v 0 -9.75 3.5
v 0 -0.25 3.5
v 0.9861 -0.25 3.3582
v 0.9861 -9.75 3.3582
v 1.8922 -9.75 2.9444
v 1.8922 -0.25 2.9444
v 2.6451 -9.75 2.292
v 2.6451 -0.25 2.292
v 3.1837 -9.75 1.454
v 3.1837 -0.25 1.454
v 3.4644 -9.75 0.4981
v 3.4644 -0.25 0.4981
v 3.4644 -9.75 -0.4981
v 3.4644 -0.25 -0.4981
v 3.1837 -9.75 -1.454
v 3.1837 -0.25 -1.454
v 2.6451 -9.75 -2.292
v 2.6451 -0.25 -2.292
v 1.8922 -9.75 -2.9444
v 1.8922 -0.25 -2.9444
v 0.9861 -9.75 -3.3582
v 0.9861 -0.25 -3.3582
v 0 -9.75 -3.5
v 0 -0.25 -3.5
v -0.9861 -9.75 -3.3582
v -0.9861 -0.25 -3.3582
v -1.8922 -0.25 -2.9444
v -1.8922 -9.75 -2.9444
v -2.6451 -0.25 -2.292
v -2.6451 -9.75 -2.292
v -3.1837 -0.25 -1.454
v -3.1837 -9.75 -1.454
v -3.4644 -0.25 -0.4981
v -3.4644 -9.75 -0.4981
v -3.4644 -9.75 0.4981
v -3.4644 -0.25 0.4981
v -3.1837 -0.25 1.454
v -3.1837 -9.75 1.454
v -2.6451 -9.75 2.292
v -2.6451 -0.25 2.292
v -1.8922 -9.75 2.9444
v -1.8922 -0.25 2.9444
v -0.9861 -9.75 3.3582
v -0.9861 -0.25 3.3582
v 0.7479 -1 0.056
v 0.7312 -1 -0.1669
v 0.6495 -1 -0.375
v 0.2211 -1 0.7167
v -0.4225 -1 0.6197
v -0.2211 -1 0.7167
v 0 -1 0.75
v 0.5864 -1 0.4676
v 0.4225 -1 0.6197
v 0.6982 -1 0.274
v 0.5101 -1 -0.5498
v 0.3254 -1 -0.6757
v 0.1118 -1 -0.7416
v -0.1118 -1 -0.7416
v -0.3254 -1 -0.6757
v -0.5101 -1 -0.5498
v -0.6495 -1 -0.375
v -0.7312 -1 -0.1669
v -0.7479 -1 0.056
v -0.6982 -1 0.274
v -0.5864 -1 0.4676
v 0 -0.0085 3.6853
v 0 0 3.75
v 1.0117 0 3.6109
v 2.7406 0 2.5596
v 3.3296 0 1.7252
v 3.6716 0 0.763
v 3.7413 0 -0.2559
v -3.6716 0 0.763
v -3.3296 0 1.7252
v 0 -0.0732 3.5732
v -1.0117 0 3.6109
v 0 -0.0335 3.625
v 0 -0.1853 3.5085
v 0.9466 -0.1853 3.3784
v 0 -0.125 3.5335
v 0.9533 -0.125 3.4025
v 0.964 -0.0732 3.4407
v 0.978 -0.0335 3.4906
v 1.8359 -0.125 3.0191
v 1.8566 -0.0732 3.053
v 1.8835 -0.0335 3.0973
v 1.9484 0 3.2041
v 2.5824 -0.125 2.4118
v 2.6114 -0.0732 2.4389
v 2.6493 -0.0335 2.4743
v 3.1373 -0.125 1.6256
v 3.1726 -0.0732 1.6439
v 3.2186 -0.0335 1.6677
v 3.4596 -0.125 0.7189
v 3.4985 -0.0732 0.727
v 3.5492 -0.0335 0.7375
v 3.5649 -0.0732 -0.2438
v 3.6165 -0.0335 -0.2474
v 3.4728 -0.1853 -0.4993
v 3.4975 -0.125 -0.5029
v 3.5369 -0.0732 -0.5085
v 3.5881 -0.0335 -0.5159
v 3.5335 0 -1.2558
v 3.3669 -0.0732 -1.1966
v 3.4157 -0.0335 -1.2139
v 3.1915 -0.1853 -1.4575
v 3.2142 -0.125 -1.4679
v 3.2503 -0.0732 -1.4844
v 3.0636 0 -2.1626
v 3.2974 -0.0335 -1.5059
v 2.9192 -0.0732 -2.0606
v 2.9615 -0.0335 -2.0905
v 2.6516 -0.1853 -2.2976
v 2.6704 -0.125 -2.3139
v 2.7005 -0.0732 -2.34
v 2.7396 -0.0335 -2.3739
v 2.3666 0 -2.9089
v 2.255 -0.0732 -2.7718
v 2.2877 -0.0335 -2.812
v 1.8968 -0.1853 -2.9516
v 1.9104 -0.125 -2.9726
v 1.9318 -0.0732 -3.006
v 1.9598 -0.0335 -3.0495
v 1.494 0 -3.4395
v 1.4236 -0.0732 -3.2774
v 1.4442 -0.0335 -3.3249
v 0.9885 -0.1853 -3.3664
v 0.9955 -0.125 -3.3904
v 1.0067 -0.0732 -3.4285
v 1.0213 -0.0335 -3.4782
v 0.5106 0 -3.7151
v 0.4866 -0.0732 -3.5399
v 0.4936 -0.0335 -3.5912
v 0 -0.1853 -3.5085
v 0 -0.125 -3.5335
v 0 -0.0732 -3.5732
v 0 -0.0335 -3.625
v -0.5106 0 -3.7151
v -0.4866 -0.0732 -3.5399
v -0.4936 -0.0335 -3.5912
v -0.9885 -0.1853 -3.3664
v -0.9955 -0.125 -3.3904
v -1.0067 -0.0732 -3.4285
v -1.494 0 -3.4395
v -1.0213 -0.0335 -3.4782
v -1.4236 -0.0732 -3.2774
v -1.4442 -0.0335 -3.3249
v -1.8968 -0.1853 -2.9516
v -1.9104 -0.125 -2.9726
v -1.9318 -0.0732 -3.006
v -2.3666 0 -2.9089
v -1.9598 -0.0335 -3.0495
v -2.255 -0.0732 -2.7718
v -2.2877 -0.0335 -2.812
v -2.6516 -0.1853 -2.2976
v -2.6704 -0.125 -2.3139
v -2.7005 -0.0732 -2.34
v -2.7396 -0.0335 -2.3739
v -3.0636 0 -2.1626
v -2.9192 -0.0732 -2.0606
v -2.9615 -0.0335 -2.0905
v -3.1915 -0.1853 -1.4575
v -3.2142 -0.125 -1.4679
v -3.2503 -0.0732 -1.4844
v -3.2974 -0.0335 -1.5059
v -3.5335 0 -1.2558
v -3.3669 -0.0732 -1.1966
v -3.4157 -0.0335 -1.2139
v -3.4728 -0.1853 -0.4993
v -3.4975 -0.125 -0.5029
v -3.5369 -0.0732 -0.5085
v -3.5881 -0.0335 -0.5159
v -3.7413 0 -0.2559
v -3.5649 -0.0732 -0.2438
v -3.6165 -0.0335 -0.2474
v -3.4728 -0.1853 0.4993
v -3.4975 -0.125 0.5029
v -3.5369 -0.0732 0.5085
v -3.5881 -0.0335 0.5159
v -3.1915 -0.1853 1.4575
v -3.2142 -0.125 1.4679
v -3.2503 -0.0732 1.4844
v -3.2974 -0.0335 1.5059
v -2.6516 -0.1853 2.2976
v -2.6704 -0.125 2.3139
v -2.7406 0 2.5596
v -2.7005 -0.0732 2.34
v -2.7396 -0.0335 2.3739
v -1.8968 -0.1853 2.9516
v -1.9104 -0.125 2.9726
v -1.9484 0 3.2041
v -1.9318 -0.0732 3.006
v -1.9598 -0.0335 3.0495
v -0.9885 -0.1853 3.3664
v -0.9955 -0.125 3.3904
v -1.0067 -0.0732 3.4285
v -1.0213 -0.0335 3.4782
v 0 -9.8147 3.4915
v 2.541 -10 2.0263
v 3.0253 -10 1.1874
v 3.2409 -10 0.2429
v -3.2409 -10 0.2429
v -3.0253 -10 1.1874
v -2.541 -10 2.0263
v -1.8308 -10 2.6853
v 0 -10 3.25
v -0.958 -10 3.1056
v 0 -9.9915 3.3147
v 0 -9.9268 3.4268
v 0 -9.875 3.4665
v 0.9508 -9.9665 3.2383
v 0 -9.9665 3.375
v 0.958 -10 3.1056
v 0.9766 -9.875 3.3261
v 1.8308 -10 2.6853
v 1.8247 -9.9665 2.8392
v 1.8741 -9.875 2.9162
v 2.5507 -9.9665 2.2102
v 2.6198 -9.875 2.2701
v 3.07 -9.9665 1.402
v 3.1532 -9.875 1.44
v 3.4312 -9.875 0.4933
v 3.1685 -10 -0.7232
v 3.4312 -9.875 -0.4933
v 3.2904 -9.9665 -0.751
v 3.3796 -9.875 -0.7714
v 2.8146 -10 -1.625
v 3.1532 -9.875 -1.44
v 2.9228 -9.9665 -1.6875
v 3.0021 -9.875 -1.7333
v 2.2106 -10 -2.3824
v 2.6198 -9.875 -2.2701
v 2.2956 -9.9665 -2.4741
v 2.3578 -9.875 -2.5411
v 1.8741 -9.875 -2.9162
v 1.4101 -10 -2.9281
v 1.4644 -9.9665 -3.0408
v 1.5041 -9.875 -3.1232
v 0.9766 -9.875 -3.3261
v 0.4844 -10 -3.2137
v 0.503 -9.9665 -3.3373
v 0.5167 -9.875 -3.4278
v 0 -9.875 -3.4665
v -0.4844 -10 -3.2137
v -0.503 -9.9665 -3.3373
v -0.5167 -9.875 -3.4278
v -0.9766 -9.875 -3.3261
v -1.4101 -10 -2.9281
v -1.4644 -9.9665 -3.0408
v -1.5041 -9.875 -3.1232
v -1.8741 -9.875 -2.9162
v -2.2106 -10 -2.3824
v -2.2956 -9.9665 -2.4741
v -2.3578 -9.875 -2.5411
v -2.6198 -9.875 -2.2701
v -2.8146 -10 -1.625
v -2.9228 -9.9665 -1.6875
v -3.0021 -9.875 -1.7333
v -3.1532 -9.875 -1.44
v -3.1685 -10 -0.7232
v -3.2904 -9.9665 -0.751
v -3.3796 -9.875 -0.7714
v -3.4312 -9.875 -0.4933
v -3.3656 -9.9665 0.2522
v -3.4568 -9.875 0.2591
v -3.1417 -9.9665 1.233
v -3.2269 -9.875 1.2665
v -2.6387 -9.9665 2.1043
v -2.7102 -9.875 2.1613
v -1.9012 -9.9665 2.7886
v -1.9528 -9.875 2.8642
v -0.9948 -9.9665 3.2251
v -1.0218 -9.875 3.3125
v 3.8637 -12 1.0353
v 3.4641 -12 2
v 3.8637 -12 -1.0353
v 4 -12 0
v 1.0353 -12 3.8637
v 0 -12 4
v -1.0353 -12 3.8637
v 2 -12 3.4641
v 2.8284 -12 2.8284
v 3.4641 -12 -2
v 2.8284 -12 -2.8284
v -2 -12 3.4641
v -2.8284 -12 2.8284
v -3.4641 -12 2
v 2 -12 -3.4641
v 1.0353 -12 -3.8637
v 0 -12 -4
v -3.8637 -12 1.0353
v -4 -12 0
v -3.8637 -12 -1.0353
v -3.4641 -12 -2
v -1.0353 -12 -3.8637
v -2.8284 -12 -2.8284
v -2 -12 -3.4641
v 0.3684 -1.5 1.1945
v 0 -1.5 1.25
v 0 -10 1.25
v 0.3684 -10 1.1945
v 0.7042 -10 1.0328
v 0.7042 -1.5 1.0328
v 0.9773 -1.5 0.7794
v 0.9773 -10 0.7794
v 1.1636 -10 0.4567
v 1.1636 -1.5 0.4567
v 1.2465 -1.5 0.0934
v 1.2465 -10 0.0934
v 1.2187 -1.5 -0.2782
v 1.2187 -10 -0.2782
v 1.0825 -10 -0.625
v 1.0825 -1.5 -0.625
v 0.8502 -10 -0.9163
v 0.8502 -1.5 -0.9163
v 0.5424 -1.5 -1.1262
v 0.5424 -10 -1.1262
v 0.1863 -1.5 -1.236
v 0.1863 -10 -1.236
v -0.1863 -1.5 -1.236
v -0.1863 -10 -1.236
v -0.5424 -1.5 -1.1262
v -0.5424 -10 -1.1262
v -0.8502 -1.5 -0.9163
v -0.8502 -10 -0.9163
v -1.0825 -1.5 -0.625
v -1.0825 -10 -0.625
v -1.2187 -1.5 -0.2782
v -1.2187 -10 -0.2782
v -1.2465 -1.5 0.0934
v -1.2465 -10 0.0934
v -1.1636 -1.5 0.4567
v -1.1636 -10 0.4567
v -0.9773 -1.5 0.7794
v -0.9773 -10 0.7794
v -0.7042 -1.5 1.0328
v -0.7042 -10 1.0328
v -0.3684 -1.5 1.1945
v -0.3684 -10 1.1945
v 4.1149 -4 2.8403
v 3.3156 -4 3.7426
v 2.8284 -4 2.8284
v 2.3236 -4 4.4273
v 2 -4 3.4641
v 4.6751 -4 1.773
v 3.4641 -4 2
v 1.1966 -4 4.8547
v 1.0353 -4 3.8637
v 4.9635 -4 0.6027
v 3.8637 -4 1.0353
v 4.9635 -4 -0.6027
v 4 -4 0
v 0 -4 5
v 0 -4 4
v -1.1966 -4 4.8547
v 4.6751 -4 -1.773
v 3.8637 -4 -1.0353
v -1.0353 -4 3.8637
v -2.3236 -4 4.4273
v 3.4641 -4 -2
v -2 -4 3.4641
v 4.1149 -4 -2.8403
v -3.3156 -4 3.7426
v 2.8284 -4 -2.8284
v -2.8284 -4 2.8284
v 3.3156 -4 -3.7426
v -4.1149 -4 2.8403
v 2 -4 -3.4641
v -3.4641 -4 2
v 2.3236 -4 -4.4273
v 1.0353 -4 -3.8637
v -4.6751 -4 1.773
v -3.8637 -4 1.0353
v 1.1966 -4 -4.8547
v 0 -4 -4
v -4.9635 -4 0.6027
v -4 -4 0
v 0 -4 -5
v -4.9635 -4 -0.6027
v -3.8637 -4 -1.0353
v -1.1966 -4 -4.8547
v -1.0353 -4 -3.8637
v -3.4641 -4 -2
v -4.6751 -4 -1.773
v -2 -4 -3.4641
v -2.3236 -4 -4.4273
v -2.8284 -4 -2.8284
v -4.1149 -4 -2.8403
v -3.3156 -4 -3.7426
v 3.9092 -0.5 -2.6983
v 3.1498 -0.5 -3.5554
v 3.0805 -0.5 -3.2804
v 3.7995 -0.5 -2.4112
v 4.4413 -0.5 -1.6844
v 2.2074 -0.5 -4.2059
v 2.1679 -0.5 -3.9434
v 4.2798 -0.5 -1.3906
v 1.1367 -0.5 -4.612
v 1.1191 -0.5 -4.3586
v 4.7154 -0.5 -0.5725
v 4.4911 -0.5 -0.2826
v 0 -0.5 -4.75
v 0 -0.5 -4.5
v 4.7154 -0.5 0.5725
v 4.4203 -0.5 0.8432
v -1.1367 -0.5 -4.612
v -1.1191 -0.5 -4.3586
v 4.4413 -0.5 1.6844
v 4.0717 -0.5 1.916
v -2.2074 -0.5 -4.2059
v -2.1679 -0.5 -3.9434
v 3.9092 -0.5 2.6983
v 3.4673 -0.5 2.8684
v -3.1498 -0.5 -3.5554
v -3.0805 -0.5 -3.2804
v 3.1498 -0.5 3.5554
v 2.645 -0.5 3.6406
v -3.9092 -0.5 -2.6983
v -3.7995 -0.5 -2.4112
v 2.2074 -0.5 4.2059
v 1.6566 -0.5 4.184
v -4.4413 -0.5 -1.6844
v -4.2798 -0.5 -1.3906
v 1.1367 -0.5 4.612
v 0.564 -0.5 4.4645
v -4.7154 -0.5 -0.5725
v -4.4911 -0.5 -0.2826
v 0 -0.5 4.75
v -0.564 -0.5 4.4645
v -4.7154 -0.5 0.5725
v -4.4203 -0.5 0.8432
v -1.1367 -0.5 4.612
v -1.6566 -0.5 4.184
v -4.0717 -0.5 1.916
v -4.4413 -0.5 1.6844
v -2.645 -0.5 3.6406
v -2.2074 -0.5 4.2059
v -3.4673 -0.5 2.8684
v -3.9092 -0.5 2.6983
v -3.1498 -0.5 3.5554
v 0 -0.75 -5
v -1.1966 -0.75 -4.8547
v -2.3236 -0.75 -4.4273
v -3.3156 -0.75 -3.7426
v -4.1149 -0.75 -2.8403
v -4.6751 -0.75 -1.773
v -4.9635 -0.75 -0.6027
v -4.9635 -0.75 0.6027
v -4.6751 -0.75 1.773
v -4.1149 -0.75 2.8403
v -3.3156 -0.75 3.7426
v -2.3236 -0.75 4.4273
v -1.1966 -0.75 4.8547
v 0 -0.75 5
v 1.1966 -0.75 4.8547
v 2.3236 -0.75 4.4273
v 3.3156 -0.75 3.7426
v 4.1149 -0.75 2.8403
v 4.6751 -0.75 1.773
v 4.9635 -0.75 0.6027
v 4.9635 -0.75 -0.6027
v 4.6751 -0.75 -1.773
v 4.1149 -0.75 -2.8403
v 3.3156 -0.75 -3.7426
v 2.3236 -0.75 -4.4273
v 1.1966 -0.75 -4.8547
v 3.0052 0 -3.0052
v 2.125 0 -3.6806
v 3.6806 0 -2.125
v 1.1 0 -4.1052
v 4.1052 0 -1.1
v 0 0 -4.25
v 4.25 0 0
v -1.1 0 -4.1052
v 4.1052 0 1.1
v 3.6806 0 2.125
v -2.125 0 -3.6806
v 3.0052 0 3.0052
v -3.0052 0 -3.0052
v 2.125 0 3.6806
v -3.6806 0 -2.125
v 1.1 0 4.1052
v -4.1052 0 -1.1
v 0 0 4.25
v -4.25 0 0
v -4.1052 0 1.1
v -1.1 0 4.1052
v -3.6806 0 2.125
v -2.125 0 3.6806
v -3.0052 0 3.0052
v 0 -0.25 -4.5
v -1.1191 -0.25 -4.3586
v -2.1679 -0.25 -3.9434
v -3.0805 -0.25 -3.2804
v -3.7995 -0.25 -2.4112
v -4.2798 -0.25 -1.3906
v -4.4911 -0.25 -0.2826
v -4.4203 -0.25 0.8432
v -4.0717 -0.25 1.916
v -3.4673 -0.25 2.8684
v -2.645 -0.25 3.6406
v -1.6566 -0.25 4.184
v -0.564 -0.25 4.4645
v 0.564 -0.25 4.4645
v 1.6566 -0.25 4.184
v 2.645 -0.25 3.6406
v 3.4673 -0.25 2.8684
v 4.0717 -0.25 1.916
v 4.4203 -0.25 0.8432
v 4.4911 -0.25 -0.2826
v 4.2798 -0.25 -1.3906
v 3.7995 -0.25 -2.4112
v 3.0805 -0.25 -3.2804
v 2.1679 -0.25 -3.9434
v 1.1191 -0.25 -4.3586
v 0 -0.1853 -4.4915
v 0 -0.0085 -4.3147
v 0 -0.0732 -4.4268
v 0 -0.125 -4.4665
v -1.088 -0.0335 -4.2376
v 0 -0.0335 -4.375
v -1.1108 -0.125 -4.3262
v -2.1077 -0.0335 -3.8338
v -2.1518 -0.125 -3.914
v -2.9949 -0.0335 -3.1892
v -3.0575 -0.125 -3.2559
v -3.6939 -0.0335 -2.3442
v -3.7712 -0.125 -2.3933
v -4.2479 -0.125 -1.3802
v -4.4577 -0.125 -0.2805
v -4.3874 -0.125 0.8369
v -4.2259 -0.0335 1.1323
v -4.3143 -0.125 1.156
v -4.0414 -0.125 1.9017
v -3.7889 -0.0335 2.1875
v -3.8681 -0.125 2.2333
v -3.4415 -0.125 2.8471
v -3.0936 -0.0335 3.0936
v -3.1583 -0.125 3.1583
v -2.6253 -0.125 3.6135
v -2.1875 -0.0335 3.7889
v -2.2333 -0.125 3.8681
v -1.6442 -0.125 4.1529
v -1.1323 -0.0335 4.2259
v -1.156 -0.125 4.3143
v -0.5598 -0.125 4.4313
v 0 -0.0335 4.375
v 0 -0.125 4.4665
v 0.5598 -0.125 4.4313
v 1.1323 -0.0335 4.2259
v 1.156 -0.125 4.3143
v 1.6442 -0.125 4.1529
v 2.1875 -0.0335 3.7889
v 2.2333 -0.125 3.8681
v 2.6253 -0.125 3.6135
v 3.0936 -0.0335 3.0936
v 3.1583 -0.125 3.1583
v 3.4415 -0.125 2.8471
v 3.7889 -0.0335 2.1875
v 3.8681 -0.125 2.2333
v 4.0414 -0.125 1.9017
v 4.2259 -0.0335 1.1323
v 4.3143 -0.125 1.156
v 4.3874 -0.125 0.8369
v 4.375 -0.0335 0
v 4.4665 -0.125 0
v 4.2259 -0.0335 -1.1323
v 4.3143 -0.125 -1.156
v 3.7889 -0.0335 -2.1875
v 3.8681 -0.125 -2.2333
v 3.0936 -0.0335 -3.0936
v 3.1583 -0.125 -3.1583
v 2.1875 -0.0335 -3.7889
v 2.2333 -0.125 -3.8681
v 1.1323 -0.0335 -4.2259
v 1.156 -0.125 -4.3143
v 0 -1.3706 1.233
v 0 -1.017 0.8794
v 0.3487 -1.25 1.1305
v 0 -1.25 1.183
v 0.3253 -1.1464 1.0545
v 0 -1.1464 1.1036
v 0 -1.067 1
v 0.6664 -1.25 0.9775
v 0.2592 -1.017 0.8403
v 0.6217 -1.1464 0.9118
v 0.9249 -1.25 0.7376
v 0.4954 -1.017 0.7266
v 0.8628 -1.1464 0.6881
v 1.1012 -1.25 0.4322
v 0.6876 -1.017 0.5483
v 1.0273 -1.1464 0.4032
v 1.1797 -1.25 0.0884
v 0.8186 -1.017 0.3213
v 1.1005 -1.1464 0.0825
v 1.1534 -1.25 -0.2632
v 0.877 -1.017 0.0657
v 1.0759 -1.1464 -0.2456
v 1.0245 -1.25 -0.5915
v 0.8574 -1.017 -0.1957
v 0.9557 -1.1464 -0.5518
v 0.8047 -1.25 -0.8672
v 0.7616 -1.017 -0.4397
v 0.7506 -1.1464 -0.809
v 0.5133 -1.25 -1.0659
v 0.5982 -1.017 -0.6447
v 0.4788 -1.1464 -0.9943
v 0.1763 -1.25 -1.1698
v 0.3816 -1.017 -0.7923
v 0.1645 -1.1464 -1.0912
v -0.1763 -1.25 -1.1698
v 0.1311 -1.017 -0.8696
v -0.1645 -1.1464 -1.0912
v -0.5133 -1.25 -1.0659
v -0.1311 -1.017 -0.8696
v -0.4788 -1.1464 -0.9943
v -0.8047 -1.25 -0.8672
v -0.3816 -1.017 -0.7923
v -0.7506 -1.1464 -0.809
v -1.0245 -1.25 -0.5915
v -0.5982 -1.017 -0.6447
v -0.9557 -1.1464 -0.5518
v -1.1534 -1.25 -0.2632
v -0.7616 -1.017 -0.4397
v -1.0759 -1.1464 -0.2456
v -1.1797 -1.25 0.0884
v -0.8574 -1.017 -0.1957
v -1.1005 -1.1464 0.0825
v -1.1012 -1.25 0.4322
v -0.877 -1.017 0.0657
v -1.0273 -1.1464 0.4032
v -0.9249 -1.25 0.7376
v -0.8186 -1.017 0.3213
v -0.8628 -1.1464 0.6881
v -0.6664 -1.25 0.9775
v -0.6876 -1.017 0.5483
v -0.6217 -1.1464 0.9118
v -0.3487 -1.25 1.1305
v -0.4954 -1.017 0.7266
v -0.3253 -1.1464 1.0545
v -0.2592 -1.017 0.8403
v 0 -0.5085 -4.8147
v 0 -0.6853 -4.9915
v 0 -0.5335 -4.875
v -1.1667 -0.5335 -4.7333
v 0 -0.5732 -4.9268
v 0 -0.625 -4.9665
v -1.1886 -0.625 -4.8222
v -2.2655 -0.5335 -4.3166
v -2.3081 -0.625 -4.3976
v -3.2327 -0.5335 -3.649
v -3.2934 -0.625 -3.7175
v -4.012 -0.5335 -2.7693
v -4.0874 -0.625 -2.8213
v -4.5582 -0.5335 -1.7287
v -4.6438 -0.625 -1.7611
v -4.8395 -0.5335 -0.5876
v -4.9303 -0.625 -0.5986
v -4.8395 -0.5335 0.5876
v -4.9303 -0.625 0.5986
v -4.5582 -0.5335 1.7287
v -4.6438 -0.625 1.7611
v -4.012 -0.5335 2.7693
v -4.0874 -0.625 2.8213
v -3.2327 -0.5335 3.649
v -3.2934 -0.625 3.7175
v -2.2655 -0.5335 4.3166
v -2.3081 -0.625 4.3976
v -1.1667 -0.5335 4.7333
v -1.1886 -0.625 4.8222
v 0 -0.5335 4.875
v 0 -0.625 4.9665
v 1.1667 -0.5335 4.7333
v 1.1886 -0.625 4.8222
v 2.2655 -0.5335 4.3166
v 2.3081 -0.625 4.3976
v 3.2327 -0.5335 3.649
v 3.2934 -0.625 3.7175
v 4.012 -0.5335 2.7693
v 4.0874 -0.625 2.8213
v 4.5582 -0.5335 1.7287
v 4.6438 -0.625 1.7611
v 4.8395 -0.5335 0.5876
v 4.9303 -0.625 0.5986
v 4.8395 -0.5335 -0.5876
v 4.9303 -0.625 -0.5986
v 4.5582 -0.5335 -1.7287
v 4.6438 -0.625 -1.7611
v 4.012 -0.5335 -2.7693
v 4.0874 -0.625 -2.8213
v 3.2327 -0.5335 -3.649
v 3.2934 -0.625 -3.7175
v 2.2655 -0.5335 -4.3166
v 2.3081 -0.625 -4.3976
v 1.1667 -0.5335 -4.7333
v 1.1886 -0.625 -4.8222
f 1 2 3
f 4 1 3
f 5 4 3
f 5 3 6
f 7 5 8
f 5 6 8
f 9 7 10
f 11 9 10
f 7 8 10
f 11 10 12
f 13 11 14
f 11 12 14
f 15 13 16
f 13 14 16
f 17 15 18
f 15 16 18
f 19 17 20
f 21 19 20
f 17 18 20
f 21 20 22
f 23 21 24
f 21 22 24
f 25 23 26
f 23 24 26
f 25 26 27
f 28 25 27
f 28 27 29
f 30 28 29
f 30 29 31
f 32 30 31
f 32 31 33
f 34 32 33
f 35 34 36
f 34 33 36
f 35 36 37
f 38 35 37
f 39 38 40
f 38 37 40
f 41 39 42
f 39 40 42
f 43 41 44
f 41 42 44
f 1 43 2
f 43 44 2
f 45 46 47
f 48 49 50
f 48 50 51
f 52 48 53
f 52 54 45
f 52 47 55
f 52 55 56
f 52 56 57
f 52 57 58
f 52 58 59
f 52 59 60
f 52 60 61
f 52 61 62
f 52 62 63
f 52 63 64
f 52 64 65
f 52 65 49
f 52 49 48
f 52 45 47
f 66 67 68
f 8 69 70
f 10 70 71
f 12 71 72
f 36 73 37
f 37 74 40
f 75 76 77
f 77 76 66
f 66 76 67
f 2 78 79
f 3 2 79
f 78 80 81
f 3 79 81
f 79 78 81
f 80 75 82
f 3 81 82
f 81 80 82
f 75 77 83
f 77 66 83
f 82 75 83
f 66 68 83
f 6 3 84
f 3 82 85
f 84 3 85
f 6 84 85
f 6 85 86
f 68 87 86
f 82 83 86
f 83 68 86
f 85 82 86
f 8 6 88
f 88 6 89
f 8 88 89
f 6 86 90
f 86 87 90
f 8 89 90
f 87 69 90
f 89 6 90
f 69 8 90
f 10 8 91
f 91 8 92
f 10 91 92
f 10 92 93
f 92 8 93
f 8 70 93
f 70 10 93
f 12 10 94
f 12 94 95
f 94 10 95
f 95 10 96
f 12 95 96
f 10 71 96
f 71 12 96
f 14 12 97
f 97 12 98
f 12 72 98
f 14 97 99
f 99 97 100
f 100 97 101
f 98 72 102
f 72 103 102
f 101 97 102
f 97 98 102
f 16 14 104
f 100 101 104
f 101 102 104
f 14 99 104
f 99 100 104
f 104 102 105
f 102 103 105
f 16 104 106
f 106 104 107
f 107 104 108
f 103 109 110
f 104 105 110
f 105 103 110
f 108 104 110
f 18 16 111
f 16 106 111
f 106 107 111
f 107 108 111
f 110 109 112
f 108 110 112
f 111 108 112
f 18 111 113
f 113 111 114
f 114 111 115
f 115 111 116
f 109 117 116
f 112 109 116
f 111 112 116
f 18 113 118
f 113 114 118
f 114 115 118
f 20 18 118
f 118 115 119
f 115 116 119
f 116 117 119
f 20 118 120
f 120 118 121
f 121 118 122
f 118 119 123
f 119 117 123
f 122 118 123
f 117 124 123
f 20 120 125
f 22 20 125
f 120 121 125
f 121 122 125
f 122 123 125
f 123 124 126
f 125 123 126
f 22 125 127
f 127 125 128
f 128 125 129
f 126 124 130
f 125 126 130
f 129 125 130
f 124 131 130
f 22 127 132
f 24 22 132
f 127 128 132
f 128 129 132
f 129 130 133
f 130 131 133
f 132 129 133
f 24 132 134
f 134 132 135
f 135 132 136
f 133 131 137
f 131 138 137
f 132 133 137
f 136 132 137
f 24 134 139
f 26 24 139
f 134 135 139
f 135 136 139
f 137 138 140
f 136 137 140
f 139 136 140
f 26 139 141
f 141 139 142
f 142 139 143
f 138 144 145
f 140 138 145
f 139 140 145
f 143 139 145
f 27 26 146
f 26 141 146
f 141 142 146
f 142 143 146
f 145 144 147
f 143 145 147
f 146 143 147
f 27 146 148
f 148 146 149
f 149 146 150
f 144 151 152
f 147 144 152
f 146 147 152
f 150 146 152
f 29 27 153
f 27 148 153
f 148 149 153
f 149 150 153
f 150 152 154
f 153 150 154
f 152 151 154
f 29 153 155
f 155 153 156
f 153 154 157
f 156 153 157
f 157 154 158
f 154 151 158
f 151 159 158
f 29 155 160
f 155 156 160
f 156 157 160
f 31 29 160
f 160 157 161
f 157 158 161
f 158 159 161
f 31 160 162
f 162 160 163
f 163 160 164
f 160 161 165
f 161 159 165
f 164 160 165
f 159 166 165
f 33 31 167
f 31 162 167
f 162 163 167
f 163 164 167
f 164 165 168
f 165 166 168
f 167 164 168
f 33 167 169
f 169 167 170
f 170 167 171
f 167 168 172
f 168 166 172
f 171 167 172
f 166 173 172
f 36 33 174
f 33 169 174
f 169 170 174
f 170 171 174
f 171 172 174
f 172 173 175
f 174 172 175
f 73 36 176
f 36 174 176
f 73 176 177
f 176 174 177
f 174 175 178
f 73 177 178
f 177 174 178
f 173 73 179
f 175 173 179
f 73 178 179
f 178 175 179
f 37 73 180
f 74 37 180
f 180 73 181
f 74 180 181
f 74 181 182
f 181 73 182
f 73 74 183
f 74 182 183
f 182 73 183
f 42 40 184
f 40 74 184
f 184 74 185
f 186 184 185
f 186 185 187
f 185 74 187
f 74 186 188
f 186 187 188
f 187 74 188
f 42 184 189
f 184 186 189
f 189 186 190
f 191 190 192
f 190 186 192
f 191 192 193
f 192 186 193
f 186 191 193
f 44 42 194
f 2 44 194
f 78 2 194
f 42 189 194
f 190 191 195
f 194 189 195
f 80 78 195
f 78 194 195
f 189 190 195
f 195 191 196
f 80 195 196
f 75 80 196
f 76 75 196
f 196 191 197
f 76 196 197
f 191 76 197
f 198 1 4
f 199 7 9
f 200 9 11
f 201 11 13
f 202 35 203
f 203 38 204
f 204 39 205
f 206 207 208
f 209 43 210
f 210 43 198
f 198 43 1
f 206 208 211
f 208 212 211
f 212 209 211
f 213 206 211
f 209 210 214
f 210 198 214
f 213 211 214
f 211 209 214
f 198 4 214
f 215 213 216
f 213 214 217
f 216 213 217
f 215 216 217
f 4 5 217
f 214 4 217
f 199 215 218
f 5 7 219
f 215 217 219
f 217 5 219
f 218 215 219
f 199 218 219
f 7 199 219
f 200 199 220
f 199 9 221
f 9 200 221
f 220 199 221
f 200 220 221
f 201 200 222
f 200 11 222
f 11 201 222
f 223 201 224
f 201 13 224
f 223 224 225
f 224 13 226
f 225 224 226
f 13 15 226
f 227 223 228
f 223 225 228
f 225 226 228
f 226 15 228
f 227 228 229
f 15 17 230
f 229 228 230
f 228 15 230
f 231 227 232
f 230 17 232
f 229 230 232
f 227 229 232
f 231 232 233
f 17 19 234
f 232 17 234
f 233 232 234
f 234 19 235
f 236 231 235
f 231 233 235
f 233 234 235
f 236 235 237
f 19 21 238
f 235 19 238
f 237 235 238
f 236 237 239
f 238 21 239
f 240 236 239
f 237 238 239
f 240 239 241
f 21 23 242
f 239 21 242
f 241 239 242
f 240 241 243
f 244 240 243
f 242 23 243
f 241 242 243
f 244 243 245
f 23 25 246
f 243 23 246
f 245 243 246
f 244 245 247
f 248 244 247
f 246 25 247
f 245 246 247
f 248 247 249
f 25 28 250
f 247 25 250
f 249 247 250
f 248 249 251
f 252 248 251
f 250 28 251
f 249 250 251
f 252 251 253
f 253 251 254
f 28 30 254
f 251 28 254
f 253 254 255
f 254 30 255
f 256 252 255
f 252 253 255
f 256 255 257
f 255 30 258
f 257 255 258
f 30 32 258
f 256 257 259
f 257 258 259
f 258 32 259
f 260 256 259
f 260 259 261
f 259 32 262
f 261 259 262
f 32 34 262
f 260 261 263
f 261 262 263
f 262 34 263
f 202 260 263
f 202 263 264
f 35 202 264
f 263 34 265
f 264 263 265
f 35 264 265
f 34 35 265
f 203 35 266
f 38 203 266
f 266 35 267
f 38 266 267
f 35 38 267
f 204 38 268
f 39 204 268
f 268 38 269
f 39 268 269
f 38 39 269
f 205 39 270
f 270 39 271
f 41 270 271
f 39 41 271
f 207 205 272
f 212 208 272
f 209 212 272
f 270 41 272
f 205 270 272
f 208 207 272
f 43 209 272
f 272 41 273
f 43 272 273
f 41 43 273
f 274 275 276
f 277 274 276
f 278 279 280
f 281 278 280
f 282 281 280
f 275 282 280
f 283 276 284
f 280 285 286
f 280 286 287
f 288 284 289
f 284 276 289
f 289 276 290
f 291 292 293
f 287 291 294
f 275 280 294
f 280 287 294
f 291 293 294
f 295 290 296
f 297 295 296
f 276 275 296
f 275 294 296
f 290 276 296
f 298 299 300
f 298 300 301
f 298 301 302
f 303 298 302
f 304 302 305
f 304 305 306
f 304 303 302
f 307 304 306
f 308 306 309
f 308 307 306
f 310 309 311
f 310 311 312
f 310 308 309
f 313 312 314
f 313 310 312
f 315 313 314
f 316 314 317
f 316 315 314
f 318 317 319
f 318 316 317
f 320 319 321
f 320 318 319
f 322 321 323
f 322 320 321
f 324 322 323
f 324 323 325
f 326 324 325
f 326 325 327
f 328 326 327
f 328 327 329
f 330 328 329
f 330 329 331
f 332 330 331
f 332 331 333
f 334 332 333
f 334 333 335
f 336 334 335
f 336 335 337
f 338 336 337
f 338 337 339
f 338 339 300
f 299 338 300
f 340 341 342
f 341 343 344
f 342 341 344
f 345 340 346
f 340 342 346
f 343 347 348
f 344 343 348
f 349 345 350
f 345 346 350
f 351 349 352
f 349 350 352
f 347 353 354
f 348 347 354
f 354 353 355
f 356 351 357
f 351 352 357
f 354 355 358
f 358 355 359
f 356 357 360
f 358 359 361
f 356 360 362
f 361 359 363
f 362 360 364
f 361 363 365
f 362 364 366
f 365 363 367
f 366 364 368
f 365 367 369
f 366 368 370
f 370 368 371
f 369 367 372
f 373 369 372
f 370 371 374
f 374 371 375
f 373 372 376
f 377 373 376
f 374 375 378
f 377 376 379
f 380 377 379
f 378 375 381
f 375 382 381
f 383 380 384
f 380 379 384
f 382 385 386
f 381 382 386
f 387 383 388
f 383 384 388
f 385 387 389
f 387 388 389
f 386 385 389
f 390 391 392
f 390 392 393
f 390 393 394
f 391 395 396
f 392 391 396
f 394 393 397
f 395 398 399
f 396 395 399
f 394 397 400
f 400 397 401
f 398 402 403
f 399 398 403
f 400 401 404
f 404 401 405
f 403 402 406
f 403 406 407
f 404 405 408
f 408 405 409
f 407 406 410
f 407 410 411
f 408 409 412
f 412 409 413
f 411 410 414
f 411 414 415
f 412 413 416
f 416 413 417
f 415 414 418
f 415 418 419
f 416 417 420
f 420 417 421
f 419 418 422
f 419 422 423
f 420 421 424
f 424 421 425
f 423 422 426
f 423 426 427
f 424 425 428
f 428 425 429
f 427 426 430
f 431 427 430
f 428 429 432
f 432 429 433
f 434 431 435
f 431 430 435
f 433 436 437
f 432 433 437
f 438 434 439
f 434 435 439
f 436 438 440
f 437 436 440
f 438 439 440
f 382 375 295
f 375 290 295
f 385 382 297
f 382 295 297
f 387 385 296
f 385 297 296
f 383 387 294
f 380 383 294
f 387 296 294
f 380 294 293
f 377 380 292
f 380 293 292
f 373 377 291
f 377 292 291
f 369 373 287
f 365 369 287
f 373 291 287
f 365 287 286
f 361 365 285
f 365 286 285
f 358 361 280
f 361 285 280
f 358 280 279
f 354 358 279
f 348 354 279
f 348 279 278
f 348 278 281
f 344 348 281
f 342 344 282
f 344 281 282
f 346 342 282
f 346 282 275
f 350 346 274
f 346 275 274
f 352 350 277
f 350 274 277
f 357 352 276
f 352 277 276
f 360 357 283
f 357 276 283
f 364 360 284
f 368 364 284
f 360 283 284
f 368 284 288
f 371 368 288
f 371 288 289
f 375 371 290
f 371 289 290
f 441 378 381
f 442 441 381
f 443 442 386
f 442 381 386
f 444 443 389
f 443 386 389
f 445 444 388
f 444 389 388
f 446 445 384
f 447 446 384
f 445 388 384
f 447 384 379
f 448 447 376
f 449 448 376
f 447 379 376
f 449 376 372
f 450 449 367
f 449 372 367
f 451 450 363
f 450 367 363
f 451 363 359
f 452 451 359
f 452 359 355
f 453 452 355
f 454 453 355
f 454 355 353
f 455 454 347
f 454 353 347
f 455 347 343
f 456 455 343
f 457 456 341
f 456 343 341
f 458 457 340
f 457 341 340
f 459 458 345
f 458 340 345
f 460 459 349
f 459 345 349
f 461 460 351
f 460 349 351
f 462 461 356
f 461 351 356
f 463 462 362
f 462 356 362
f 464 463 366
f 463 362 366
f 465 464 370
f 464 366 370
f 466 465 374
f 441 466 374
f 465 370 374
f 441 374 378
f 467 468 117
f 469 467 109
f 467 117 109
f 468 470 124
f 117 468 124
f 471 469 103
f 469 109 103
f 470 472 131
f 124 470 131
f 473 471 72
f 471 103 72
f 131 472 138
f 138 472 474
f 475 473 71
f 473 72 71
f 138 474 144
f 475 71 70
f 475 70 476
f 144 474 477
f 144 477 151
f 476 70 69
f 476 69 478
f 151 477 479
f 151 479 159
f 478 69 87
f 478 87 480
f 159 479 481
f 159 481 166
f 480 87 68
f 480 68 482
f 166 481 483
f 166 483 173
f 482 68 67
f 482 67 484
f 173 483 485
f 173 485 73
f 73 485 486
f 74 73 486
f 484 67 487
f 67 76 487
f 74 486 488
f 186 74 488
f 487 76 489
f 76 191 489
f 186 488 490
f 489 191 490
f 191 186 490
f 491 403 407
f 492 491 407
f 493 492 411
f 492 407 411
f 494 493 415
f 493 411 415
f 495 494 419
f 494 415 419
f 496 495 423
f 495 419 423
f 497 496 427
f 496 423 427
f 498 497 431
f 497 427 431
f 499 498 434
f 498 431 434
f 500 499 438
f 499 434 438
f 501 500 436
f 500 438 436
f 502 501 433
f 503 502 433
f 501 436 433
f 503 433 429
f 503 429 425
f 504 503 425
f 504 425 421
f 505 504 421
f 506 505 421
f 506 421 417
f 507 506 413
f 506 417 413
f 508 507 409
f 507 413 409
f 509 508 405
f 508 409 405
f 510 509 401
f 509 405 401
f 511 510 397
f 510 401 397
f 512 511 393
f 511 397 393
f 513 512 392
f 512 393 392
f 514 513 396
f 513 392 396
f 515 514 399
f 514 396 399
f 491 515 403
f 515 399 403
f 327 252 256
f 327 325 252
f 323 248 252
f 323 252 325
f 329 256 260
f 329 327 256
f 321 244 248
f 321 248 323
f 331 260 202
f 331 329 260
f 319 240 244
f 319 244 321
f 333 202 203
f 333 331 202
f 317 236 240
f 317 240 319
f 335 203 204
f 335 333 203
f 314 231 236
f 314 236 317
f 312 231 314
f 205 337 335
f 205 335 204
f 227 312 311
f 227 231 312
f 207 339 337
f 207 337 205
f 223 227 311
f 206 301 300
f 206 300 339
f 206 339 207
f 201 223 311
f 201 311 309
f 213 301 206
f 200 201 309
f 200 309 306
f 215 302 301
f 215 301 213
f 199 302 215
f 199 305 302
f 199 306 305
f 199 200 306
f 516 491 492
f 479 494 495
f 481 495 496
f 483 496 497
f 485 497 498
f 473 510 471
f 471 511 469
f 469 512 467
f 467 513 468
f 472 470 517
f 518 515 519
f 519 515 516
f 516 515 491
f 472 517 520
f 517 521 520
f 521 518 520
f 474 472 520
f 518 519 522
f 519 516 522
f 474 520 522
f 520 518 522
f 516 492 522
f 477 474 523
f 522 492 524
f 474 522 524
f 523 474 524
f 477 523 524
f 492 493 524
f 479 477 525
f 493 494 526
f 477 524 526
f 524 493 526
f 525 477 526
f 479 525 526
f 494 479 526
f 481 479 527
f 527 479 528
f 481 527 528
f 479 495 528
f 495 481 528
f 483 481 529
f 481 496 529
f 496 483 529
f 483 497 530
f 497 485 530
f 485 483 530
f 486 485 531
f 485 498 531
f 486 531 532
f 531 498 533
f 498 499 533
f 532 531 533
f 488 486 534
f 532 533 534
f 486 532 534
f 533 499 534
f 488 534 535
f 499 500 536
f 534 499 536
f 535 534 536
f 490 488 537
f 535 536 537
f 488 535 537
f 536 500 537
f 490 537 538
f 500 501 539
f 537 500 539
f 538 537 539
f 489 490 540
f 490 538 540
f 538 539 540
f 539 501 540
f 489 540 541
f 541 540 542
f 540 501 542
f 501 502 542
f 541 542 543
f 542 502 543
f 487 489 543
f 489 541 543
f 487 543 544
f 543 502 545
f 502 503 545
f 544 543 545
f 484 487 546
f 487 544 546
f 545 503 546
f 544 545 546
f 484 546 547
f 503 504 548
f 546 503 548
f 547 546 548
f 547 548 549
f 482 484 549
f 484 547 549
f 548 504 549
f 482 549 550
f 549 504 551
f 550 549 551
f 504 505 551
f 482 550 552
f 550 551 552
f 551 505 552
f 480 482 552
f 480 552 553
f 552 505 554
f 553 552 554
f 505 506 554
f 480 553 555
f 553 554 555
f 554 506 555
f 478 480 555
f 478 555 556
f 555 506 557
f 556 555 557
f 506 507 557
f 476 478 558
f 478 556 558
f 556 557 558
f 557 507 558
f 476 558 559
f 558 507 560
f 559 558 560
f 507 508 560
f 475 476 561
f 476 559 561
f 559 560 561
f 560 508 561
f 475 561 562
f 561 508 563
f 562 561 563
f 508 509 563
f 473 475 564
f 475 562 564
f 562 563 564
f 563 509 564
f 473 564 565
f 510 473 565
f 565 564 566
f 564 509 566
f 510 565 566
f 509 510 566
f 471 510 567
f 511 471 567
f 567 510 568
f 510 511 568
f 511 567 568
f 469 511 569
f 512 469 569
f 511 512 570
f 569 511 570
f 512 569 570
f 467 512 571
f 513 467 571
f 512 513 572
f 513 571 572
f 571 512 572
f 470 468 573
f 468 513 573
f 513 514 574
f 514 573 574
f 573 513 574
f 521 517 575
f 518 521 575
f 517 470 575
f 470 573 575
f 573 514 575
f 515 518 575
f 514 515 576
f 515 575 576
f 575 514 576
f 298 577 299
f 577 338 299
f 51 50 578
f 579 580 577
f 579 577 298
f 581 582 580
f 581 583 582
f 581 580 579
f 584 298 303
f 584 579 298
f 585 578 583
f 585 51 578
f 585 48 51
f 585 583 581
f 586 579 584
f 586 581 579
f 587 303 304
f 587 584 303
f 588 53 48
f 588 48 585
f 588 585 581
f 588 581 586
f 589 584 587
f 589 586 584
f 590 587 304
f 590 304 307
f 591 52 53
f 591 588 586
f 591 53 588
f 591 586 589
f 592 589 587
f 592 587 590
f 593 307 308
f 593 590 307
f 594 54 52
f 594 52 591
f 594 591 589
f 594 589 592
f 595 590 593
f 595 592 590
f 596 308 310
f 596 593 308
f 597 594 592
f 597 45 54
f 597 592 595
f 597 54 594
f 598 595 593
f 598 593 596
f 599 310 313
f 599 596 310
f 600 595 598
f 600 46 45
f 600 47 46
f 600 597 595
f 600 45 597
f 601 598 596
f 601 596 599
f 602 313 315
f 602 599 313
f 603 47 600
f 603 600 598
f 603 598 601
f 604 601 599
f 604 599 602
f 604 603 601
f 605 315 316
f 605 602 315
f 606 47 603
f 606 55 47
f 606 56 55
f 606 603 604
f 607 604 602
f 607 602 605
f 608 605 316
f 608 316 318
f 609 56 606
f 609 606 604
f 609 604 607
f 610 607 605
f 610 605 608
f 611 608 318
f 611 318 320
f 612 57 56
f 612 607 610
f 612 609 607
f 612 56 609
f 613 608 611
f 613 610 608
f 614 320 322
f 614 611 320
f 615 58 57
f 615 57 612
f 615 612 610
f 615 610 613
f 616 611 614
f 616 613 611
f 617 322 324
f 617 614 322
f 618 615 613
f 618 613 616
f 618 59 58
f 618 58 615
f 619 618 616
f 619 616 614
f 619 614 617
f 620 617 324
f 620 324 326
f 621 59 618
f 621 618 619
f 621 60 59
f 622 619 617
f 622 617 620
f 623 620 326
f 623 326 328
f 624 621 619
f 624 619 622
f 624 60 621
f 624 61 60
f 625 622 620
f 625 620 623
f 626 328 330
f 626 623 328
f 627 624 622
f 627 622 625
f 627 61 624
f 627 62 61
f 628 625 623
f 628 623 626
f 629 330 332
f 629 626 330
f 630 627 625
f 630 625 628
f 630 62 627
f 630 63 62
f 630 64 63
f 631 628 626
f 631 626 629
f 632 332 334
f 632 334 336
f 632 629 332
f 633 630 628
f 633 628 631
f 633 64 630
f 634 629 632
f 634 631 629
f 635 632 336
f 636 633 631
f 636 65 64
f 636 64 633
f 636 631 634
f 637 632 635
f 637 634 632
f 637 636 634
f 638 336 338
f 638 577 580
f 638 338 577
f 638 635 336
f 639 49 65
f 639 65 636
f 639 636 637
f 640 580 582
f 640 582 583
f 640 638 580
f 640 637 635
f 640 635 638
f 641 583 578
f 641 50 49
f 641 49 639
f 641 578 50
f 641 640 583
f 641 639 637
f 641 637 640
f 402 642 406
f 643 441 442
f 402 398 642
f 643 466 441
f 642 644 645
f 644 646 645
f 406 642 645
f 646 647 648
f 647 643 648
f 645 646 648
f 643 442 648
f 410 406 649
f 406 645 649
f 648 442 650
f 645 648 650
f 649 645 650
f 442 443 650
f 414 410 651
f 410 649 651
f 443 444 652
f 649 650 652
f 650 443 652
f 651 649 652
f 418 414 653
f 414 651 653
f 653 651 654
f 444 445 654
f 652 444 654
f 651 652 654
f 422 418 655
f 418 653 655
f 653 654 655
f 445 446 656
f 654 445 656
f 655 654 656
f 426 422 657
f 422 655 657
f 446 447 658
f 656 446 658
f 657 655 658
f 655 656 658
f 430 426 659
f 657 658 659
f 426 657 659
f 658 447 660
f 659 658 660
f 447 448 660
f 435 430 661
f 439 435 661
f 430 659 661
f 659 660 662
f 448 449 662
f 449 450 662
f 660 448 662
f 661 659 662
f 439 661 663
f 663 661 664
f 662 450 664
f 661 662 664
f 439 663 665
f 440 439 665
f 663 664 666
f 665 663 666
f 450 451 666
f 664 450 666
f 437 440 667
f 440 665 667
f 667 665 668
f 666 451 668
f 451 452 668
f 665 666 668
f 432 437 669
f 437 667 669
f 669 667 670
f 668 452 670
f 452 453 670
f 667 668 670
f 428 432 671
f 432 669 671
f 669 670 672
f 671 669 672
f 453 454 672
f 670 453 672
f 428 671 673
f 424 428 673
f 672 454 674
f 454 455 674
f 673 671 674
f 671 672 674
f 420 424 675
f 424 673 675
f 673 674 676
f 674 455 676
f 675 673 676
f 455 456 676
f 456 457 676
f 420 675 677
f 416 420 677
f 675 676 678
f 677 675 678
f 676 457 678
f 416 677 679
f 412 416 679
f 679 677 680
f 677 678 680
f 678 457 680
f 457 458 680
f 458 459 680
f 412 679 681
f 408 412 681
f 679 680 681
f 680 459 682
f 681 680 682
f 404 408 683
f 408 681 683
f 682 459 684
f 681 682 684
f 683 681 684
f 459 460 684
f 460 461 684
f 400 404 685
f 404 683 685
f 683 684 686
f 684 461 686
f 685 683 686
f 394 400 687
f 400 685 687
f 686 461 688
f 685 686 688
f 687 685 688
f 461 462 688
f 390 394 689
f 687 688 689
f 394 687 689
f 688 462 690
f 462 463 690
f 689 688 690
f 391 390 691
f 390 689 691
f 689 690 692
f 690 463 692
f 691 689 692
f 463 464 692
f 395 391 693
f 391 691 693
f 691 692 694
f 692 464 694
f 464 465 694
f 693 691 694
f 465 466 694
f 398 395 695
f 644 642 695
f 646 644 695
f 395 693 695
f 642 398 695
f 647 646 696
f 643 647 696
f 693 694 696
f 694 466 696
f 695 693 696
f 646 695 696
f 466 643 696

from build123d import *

# Parameters (mm, degrees)
SKETCH2_R            = 3.5
SKETCH2_R_2          = 1.25
INSIDE_CUT_DEPTH     = 10
SKETCH3_R            = 1.25
PIN_SHORTENING_DEPTH = 1
FILLET1_R            = 0.5
FILLET2_R            = 0.25


with BuildPart() as part:
    # Sketch1 → BULK (revolve)
    with BuildSketch(Plane.XY, mode=Mode.PRIVATE) as bulk_sk:
        Polygon((0, 0), (4.5, 0), (4.5, -0.5), (5, -0.5), (5, -4), (4, -4), (4, -12), (0, -12), align=None)
    revolve(bulk_sk.sketch.rotate(Axis((0, -12, 0), (0, 1, 0)), 90), axis=Axis((0, -12, 0), (0, 1, 0)))

    # Sketch2 → INSIDE CUT (cut)
    with BuildSketch(Plane(origin=(0, 0, 0), x_dir=(1, 0, 0), z_dir=(0, 1, 0))):
        with Locations(Location((0, 0, 0), (0, 0, 270))):
            Circle(SKETCH2_R)
        with Locations(Location((0, 0, 0), (0, 0, 270))):
            Circle(SKETCH2_R_2, mode=Mode.SUBTRACT)
    extrude(amount=-INSIDE_CUT_DEPTH, mode=Mode.SUBTRACT)

    # Sketch3 → PIN SHORTENING (cut)
    with BuildSketch(Plane(origin=(0, 0, 0), x_dir=(1, 0, 0), z_dir=(0, 1, 0))):
        with Locations(Location((0, 0, 0), (0, 0, 270))):
            Circle(SKETCH3_R)
    extrude(amount=-PIN_SHORTENING_DEPTH, mode=Mode.SUBTRACT)

    # Fillet1
    fillet1_edges = [part.edges().sort_by_distance(p)[0] for p in [
        (0, -1, -1.25),
    ]]
    fillet(fillet1_edges, radius=FILLET1_R)

    # Fillet2
    fillet2_edges = [part.edges().sort_by_distance(p)[0] for p in [
        (0, -10, -3.5),
        (0, 0, -3.5),
        (0, -0.5, 5),
        (0, 0, 4.5),
    ]]
    fillet(fillet2_edges, radius=FILLET2_R)


solid = part.part
